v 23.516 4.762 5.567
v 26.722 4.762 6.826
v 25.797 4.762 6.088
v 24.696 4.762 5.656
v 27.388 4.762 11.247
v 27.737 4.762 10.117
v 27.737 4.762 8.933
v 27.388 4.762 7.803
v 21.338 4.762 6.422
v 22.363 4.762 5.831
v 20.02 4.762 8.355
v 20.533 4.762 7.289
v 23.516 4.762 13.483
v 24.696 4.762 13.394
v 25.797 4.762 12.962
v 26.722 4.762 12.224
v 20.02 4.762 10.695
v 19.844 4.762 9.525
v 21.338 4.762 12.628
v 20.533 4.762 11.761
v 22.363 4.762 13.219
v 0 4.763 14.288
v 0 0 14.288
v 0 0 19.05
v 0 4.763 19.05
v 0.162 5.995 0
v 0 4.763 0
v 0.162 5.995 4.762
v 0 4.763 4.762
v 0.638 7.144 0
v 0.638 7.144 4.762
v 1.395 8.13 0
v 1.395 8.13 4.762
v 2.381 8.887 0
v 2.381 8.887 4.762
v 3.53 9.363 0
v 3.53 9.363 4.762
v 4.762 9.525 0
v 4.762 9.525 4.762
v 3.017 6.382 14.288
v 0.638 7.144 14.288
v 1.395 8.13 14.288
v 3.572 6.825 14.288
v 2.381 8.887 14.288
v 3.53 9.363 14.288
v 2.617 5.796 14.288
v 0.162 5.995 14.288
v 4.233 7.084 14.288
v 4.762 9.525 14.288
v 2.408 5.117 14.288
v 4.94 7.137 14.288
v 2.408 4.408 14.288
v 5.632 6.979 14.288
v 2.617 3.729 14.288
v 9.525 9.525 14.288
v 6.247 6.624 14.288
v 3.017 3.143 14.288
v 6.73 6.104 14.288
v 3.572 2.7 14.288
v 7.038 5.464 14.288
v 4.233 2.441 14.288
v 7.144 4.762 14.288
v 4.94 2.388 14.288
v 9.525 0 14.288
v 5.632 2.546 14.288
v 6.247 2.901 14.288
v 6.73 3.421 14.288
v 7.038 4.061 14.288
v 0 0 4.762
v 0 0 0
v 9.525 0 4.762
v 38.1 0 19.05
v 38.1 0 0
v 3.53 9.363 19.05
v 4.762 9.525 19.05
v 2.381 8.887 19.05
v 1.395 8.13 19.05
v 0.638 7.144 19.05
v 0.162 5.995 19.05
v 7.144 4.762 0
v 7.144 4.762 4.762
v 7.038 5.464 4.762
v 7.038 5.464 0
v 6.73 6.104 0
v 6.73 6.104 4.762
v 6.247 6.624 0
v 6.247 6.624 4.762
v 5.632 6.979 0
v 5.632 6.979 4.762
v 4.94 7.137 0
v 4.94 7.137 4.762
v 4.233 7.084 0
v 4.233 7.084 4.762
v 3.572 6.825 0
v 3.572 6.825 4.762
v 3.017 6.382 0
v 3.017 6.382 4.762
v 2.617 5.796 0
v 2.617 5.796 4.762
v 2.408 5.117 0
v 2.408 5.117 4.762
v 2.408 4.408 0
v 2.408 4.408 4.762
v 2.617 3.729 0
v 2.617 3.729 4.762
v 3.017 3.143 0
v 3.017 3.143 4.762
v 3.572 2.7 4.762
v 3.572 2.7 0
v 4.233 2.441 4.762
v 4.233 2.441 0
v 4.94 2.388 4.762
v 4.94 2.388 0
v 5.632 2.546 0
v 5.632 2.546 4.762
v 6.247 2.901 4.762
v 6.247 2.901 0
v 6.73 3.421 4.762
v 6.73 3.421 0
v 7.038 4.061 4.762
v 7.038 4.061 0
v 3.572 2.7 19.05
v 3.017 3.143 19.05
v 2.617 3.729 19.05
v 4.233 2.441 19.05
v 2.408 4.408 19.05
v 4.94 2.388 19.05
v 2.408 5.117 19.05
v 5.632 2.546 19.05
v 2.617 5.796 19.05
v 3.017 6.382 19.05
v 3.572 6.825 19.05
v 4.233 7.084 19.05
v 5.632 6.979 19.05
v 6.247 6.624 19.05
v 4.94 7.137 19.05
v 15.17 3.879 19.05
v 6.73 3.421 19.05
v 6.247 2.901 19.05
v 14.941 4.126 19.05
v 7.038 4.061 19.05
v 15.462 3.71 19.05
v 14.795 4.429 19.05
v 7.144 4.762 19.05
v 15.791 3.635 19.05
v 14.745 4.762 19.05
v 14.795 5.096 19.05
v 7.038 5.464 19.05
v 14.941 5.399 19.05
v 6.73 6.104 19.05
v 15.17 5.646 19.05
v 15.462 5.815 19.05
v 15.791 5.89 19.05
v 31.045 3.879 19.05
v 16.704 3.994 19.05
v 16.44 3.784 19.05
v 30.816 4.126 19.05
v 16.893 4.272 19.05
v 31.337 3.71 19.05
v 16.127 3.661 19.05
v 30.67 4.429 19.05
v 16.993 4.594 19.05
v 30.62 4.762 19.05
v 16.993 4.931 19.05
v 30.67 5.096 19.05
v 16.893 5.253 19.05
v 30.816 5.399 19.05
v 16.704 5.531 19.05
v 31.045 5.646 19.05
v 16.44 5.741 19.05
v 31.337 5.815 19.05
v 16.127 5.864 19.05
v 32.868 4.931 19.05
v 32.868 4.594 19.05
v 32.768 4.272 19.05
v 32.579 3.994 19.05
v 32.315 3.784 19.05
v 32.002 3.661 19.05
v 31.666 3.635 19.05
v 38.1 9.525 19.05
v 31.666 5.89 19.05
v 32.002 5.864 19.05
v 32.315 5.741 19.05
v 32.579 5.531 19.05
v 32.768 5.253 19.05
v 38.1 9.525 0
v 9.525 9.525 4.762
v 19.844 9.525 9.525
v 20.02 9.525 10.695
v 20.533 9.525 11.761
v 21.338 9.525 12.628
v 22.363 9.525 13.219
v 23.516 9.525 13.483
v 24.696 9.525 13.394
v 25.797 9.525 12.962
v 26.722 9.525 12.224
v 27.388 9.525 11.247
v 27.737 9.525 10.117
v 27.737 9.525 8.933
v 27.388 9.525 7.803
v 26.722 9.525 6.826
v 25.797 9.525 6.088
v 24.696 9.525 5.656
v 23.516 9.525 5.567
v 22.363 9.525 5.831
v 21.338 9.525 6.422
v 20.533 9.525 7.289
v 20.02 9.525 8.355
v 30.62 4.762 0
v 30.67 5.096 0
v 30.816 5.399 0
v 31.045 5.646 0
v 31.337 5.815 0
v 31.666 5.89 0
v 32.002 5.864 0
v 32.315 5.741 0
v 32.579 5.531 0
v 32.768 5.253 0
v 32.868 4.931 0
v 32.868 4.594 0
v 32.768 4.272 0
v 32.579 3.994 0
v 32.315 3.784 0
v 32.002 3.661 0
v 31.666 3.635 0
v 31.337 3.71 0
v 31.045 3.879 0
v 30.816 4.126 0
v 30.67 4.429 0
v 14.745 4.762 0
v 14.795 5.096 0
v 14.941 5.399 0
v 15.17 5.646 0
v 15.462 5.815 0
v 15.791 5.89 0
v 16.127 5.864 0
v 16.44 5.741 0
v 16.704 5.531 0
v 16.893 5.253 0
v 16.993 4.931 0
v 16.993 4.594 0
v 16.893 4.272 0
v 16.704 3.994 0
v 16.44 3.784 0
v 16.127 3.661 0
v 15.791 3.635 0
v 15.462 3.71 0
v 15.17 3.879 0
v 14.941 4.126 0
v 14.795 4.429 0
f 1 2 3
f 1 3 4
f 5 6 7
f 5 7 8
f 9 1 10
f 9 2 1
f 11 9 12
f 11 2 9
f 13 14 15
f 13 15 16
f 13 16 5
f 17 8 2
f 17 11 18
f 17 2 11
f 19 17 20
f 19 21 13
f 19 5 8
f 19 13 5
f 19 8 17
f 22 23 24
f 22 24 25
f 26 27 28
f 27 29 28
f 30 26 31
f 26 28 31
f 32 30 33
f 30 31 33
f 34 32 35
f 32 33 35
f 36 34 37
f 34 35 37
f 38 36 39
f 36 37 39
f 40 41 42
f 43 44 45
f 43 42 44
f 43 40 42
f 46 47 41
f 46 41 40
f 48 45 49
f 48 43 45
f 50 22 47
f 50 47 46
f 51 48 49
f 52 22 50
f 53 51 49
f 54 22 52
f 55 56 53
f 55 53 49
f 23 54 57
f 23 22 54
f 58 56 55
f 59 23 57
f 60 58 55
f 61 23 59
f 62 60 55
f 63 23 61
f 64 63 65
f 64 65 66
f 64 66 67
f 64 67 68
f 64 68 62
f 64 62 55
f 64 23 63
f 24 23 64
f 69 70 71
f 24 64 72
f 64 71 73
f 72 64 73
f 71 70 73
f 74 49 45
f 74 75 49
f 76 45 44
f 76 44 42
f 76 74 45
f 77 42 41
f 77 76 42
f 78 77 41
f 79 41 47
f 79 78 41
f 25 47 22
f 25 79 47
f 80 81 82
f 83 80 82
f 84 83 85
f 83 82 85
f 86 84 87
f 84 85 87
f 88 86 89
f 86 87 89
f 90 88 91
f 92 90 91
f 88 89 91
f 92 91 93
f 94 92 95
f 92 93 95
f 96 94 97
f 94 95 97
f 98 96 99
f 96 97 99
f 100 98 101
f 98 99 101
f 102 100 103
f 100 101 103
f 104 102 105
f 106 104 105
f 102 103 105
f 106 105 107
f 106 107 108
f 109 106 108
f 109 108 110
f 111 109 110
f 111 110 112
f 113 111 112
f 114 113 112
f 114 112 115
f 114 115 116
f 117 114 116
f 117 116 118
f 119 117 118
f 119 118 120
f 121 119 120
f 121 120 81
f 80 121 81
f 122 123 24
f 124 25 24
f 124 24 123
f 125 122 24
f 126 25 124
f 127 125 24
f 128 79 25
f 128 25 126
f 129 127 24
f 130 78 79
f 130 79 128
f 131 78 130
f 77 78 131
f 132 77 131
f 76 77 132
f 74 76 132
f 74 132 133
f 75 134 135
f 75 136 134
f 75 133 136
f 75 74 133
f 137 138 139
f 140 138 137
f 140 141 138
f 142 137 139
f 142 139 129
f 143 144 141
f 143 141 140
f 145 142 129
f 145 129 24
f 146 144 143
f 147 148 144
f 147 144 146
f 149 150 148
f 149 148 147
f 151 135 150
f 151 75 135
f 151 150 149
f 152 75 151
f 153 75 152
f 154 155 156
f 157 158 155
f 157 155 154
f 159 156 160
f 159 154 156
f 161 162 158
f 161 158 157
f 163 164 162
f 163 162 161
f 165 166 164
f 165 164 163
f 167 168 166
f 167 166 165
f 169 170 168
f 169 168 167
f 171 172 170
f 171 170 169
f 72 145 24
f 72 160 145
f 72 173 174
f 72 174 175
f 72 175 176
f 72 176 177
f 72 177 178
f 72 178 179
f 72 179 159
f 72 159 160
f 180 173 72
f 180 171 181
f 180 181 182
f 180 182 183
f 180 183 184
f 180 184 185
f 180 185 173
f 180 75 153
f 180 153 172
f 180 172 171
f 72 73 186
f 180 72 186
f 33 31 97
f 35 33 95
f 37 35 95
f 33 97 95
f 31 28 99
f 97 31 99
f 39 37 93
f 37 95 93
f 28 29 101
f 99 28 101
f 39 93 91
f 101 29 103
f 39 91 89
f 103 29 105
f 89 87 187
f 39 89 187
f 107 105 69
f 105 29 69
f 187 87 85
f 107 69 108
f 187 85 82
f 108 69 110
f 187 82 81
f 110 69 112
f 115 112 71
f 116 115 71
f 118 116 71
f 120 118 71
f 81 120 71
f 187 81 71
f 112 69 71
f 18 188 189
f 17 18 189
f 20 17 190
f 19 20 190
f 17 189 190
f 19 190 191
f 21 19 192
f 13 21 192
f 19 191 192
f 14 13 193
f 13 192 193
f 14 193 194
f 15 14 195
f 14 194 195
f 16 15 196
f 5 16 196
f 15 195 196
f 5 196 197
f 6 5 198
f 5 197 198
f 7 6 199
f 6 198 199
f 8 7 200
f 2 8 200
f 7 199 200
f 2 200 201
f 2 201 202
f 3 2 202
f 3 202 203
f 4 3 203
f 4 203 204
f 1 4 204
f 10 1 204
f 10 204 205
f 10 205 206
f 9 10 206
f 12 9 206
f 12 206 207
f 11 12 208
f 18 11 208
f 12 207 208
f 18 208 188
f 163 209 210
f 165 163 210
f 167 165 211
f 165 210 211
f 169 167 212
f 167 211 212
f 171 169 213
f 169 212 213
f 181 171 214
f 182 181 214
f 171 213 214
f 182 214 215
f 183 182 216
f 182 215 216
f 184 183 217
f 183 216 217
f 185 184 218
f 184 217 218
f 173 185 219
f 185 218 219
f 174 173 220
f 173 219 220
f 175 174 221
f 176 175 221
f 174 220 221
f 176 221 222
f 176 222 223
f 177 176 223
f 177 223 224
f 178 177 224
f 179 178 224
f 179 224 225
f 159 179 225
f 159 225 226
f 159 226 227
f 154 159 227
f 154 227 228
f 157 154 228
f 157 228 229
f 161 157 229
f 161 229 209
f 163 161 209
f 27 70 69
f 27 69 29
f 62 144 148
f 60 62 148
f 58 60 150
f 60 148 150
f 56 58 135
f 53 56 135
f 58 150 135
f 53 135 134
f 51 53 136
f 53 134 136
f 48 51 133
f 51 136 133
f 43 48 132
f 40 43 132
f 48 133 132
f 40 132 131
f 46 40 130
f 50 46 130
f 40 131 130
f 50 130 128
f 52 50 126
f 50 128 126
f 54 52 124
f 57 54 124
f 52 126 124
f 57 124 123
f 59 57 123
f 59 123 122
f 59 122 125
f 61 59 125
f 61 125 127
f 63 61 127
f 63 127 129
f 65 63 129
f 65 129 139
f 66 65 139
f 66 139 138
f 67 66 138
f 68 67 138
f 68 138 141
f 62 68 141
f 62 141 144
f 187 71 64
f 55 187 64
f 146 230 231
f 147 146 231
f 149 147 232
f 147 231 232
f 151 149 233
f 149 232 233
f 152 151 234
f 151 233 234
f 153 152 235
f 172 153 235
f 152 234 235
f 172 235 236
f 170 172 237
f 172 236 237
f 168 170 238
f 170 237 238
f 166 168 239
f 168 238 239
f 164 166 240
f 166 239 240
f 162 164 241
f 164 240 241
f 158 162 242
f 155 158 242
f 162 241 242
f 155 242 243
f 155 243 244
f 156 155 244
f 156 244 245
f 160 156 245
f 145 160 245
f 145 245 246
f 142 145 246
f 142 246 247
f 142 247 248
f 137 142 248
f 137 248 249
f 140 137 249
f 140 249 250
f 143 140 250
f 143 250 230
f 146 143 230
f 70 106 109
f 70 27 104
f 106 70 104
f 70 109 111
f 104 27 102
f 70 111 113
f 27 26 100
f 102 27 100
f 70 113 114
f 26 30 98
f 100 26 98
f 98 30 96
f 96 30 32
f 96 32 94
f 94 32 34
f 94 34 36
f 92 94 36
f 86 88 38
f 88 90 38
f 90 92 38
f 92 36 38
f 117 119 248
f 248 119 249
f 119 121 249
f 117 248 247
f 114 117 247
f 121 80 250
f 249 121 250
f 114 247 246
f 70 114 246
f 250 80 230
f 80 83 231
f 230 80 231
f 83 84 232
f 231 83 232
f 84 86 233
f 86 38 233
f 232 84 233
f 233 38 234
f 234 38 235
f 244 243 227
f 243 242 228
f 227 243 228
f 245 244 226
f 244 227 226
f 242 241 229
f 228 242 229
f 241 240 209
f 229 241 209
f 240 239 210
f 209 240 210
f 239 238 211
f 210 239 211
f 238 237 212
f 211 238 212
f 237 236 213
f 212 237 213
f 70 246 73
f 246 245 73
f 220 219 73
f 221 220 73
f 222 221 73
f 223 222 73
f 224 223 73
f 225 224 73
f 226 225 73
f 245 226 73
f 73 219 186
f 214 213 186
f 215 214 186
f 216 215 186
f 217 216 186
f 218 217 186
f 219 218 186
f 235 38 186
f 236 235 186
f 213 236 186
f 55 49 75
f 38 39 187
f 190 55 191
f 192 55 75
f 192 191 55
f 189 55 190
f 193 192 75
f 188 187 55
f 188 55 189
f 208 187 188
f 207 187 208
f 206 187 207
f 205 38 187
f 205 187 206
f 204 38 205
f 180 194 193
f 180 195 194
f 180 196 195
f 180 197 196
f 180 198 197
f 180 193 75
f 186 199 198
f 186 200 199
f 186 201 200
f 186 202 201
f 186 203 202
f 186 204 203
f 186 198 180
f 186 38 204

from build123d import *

# Parameters (mm, degrees)
F0_W      = 38.1
F0_H      = 9.525
F1_DEPTH  = 19.05
F3_D      = 2.2606
F4_W      = 9.525
F4_H      = 9.525
F5_DEPTH  = 9.526
F7_DEPTH  = 19.051
F8_R      = 4.7625
F9_R      = 3.96875
F10_DEPTH = 4.7625


with BuildPart() as f1:
    # F0 (on Top) → F1 (new body)
    with BuildSketch(Plane.XY):
        with Locations((19.05, 4.7625)):
            Rectangle(F0_W, F0_H)
    extrude(amount=F1_DEPTH)

    # F3 (through all)
    with Locations(Plane.XY.offset(19.05)):
        with Locations((15.875, 4.7625), (31.75, 4.7625)):
            Hole(F3_D / 2)

    # F4 (on face) → F5 (cut, through all)
    with BuildSketch(Plane.XZ):
        with Locations((4.7625, 9.525)):
            Rectangle(F4_W, F4_H)
    extrude(amount=-F5_DEPTH, mode=Mode.SUBTRACT)

    # F6 (on face) → F7 (cut, through all)
    with BuildSketch(Plane.XY.offset(19.05)):
        with BuildLine():
            ThreePointArc((2.38125, 4.7625), (4.7625, 2.38125), (7.14375, 4.7625))
            ThreePointArc((7.14375, 4.7625), (4.7625, 7.14375), (2.38125, 4.7625))
        make_face()
    extrude(amount=-F7_DEPTH, mode=Mode.SUBTRACT)

    # F8
    f8_edges = [f1.edges().sort_by_distance(p)[0] for p in [
        (0, 9.525, 16.66875),
        (0, 9.525, 2.38125),
    ]]
    fillet(f8_edges, radius=F8_R)

    # F9 (on face) → F10 (cut)
    with BuildSketch(Plane(origin=(0, 9.525, 0), x_dir=(-1, 0, 0), z_dir=(0, 1, 0))):
        with Locations((-23.8125, 9.525)):
            Circle(F9_R)
    extrude(amount=-F10_DEPTH, mode=Mode.SUBTRACT)


solid = f1.part
